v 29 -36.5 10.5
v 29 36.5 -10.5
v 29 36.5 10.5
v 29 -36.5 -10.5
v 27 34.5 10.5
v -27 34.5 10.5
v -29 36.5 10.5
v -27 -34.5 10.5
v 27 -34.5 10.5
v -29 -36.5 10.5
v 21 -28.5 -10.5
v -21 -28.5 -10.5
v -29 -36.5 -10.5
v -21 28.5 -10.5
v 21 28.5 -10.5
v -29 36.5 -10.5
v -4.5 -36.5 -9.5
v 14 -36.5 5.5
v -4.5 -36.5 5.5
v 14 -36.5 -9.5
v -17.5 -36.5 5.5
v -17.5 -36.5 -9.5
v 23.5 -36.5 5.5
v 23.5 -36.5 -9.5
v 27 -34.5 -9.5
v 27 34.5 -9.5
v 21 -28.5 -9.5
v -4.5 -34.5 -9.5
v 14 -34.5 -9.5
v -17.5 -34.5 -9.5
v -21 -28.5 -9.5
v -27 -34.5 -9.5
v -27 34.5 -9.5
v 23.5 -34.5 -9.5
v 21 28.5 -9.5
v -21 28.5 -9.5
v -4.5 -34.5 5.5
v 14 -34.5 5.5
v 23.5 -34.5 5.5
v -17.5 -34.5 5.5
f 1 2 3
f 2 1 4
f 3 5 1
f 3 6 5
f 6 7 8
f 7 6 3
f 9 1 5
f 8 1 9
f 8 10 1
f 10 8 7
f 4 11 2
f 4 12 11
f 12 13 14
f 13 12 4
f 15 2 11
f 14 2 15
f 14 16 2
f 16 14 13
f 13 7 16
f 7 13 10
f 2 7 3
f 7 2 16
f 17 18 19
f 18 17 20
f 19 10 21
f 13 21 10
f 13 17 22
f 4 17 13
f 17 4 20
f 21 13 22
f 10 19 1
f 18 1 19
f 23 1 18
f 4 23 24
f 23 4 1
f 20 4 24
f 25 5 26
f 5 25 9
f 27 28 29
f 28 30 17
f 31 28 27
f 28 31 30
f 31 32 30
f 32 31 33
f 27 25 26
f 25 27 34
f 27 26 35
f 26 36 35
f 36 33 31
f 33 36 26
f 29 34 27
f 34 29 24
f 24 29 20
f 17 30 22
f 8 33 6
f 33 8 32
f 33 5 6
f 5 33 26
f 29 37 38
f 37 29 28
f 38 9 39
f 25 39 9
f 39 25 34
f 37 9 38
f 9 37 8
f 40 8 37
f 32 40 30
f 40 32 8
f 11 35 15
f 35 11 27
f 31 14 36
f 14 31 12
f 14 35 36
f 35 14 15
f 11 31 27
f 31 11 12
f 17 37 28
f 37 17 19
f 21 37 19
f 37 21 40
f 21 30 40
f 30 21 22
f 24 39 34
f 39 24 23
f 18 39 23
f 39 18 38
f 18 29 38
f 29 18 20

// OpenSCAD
arduino_width = 54;
arduino_length = 69;
arduino_usb_width = 13;
arduino_usb_height = 15;
arduino_usb_x = 9.5;
arduino_power_width = 9.5;
arduino_power_height = 15;
arduino_power_x = 3.5;

wall_thickness = 2;
wall_height = 20;
bottom_thickness = 1;
side_shoulder = 6;

difference()
{
	// Exterior box
	cube([arduino_width+(2*wall_thickness),arduino_length+(2*wall_thickness),wall_height+bottom_thickness], center=true);

	// Interior recess
	translate([0,0,bottom_thickness/2.0])
		cube([arduino_width,arduino_length,wall_height], center=true);

	// Bottom hole
	cube([arduino_width-(2*side_shoulder),arduino_length-(2*side_shoulder),wall_height+bottom_thickness], center=true);

	// USB hole
	translate([	-1*((arduino_width/2.0)-(arduino_usb_width/2.0)-arduino_usb_x),
			-1*(arduino_length/2.0)-(wall_thickness/2.0),
			-1*(wall_height/2.0 - arduino_usb_height/2.0)+bottom_thickness/2.0])
	{
		cube([arduino_usb_width,wall_thickness,arduino_usb_height], center=true);
	}

	// Power hole
	translate([	((arduino_width/2.0)-(arduino_power_width/2.0)-arduino_power_x),
			-1*(arduino_length/2.0)-(wall_thickness/2.0),
			-1*(wall_height/2.0 - arduino_power_height/2.0)+bottom_thickness/2.0])
	{
		cube([arduino_power_width,wall_thickness,arduino_power_height], center=true);
	}
	
}
